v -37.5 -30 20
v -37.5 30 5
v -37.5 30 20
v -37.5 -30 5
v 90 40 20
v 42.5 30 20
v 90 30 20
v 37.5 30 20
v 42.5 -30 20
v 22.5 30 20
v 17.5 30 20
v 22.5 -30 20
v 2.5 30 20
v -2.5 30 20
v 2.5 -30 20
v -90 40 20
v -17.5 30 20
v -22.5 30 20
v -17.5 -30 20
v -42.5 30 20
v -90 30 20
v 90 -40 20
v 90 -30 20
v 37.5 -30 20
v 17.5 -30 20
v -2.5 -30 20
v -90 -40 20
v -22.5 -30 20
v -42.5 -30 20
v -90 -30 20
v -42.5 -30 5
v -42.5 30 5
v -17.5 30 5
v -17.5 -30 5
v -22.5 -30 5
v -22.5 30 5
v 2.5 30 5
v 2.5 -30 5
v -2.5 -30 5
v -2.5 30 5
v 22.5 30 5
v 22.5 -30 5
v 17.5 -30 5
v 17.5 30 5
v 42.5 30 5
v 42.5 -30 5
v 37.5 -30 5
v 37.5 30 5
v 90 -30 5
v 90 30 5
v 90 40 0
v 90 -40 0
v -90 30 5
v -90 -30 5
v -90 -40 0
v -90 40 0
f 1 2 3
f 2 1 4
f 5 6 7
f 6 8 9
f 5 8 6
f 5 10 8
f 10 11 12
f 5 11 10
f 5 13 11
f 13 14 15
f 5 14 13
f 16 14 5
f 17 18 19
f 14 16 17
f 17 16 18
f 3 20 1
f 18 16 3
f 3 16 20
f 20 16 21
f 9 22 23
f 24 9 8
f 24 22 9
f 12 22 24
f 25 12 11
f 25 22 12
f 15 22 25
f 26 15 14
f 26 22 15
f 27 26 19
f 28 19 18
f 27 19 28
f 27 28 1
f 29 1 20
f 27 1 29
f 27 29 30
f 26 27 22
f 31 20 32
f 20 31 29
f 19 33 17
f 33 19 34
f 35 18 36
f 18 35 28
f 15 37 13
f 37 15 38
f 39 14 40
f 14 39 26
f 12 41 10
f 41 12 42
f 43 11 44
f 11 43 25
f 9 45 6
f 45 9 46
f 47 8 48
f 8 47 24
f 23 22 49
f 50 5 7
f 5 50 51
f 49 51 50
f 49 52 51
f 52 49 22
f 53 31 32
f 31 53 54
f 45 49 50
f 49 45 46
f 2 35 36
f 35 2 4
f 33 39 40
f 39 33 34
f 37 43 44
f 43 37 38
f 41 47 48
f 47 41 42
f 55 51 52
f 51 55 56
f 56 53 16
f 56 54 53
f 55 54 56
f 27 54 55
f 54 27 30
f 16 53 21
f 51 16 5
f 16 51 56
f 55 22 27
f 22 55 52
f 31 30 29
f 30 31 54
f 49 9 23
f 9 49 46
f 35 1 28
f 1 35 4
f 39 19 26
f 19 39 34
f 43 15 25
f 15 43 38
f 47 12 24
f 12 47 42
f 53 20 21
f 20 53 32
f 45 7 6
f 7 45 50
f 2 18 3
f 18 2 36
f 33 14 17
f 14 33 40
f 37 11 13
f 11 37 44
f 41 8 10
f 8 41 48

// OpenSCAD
$fn = 32;

// ----------------------------------------------------------------------
// Rib frame 180 x 80 x 20
// 5 ribs at 20 mm pitch
// ----------------------------------------------------------------------

// --- parameters (mm) ---
frame = [180, 80, 5];  // base plate size (x, y, z)
rail_w = 10;           // side rail width
ribs = 5;              // number of ribs
rib_t = 5;             // rib thickness
rib_h = 15;            // rib height above the base plate
pitch = 20;            // pitch between rib centres

// --- derived feature positions (mm) ---
span = (ribs - 1) * pitch;          // = 80   distance between the outer ribs
origin_x = -span / 2;               // = -40   X of the first rib
rib_len = frame[1] - 2 * rail_w + 2;  // = 62   rib length, 1 mm into each rail
feature_centers = [
  [origin_x + 0 * pitch, 0],
  [origin_x + 1 * pitch, 0],
  [origin_x + 2 * pitch, 0],
  [origin_x + 3 * pitch, 0],
  [origin_x + 4 * pitch, 0]
];   // rib centre line, drives the rib loop

// base plate, two side rails, then the ribs read straight off feature_centers
union() {
  translate([-frame[0] / 2, -frame[1] / 2, 0]) cube(frame);
  translate([-frame[0] / 2, -frame[1] / 2, 0]) cube([frame[0], rail_w, frame[2] + rib_h]);
  translate([-frame[0] / 2, frame[1] / 2 - rail_w, 0]) cube([frame[0], rail_w, frame[2] + rib_h]);
  for (centre = feature_centers)
    translate([centre[0] - rib_t / 2, centre[1] - rib_len / 2, frame[2] - 1])
      cube([rib_t, rib_len, rib_h + 1]);
}
